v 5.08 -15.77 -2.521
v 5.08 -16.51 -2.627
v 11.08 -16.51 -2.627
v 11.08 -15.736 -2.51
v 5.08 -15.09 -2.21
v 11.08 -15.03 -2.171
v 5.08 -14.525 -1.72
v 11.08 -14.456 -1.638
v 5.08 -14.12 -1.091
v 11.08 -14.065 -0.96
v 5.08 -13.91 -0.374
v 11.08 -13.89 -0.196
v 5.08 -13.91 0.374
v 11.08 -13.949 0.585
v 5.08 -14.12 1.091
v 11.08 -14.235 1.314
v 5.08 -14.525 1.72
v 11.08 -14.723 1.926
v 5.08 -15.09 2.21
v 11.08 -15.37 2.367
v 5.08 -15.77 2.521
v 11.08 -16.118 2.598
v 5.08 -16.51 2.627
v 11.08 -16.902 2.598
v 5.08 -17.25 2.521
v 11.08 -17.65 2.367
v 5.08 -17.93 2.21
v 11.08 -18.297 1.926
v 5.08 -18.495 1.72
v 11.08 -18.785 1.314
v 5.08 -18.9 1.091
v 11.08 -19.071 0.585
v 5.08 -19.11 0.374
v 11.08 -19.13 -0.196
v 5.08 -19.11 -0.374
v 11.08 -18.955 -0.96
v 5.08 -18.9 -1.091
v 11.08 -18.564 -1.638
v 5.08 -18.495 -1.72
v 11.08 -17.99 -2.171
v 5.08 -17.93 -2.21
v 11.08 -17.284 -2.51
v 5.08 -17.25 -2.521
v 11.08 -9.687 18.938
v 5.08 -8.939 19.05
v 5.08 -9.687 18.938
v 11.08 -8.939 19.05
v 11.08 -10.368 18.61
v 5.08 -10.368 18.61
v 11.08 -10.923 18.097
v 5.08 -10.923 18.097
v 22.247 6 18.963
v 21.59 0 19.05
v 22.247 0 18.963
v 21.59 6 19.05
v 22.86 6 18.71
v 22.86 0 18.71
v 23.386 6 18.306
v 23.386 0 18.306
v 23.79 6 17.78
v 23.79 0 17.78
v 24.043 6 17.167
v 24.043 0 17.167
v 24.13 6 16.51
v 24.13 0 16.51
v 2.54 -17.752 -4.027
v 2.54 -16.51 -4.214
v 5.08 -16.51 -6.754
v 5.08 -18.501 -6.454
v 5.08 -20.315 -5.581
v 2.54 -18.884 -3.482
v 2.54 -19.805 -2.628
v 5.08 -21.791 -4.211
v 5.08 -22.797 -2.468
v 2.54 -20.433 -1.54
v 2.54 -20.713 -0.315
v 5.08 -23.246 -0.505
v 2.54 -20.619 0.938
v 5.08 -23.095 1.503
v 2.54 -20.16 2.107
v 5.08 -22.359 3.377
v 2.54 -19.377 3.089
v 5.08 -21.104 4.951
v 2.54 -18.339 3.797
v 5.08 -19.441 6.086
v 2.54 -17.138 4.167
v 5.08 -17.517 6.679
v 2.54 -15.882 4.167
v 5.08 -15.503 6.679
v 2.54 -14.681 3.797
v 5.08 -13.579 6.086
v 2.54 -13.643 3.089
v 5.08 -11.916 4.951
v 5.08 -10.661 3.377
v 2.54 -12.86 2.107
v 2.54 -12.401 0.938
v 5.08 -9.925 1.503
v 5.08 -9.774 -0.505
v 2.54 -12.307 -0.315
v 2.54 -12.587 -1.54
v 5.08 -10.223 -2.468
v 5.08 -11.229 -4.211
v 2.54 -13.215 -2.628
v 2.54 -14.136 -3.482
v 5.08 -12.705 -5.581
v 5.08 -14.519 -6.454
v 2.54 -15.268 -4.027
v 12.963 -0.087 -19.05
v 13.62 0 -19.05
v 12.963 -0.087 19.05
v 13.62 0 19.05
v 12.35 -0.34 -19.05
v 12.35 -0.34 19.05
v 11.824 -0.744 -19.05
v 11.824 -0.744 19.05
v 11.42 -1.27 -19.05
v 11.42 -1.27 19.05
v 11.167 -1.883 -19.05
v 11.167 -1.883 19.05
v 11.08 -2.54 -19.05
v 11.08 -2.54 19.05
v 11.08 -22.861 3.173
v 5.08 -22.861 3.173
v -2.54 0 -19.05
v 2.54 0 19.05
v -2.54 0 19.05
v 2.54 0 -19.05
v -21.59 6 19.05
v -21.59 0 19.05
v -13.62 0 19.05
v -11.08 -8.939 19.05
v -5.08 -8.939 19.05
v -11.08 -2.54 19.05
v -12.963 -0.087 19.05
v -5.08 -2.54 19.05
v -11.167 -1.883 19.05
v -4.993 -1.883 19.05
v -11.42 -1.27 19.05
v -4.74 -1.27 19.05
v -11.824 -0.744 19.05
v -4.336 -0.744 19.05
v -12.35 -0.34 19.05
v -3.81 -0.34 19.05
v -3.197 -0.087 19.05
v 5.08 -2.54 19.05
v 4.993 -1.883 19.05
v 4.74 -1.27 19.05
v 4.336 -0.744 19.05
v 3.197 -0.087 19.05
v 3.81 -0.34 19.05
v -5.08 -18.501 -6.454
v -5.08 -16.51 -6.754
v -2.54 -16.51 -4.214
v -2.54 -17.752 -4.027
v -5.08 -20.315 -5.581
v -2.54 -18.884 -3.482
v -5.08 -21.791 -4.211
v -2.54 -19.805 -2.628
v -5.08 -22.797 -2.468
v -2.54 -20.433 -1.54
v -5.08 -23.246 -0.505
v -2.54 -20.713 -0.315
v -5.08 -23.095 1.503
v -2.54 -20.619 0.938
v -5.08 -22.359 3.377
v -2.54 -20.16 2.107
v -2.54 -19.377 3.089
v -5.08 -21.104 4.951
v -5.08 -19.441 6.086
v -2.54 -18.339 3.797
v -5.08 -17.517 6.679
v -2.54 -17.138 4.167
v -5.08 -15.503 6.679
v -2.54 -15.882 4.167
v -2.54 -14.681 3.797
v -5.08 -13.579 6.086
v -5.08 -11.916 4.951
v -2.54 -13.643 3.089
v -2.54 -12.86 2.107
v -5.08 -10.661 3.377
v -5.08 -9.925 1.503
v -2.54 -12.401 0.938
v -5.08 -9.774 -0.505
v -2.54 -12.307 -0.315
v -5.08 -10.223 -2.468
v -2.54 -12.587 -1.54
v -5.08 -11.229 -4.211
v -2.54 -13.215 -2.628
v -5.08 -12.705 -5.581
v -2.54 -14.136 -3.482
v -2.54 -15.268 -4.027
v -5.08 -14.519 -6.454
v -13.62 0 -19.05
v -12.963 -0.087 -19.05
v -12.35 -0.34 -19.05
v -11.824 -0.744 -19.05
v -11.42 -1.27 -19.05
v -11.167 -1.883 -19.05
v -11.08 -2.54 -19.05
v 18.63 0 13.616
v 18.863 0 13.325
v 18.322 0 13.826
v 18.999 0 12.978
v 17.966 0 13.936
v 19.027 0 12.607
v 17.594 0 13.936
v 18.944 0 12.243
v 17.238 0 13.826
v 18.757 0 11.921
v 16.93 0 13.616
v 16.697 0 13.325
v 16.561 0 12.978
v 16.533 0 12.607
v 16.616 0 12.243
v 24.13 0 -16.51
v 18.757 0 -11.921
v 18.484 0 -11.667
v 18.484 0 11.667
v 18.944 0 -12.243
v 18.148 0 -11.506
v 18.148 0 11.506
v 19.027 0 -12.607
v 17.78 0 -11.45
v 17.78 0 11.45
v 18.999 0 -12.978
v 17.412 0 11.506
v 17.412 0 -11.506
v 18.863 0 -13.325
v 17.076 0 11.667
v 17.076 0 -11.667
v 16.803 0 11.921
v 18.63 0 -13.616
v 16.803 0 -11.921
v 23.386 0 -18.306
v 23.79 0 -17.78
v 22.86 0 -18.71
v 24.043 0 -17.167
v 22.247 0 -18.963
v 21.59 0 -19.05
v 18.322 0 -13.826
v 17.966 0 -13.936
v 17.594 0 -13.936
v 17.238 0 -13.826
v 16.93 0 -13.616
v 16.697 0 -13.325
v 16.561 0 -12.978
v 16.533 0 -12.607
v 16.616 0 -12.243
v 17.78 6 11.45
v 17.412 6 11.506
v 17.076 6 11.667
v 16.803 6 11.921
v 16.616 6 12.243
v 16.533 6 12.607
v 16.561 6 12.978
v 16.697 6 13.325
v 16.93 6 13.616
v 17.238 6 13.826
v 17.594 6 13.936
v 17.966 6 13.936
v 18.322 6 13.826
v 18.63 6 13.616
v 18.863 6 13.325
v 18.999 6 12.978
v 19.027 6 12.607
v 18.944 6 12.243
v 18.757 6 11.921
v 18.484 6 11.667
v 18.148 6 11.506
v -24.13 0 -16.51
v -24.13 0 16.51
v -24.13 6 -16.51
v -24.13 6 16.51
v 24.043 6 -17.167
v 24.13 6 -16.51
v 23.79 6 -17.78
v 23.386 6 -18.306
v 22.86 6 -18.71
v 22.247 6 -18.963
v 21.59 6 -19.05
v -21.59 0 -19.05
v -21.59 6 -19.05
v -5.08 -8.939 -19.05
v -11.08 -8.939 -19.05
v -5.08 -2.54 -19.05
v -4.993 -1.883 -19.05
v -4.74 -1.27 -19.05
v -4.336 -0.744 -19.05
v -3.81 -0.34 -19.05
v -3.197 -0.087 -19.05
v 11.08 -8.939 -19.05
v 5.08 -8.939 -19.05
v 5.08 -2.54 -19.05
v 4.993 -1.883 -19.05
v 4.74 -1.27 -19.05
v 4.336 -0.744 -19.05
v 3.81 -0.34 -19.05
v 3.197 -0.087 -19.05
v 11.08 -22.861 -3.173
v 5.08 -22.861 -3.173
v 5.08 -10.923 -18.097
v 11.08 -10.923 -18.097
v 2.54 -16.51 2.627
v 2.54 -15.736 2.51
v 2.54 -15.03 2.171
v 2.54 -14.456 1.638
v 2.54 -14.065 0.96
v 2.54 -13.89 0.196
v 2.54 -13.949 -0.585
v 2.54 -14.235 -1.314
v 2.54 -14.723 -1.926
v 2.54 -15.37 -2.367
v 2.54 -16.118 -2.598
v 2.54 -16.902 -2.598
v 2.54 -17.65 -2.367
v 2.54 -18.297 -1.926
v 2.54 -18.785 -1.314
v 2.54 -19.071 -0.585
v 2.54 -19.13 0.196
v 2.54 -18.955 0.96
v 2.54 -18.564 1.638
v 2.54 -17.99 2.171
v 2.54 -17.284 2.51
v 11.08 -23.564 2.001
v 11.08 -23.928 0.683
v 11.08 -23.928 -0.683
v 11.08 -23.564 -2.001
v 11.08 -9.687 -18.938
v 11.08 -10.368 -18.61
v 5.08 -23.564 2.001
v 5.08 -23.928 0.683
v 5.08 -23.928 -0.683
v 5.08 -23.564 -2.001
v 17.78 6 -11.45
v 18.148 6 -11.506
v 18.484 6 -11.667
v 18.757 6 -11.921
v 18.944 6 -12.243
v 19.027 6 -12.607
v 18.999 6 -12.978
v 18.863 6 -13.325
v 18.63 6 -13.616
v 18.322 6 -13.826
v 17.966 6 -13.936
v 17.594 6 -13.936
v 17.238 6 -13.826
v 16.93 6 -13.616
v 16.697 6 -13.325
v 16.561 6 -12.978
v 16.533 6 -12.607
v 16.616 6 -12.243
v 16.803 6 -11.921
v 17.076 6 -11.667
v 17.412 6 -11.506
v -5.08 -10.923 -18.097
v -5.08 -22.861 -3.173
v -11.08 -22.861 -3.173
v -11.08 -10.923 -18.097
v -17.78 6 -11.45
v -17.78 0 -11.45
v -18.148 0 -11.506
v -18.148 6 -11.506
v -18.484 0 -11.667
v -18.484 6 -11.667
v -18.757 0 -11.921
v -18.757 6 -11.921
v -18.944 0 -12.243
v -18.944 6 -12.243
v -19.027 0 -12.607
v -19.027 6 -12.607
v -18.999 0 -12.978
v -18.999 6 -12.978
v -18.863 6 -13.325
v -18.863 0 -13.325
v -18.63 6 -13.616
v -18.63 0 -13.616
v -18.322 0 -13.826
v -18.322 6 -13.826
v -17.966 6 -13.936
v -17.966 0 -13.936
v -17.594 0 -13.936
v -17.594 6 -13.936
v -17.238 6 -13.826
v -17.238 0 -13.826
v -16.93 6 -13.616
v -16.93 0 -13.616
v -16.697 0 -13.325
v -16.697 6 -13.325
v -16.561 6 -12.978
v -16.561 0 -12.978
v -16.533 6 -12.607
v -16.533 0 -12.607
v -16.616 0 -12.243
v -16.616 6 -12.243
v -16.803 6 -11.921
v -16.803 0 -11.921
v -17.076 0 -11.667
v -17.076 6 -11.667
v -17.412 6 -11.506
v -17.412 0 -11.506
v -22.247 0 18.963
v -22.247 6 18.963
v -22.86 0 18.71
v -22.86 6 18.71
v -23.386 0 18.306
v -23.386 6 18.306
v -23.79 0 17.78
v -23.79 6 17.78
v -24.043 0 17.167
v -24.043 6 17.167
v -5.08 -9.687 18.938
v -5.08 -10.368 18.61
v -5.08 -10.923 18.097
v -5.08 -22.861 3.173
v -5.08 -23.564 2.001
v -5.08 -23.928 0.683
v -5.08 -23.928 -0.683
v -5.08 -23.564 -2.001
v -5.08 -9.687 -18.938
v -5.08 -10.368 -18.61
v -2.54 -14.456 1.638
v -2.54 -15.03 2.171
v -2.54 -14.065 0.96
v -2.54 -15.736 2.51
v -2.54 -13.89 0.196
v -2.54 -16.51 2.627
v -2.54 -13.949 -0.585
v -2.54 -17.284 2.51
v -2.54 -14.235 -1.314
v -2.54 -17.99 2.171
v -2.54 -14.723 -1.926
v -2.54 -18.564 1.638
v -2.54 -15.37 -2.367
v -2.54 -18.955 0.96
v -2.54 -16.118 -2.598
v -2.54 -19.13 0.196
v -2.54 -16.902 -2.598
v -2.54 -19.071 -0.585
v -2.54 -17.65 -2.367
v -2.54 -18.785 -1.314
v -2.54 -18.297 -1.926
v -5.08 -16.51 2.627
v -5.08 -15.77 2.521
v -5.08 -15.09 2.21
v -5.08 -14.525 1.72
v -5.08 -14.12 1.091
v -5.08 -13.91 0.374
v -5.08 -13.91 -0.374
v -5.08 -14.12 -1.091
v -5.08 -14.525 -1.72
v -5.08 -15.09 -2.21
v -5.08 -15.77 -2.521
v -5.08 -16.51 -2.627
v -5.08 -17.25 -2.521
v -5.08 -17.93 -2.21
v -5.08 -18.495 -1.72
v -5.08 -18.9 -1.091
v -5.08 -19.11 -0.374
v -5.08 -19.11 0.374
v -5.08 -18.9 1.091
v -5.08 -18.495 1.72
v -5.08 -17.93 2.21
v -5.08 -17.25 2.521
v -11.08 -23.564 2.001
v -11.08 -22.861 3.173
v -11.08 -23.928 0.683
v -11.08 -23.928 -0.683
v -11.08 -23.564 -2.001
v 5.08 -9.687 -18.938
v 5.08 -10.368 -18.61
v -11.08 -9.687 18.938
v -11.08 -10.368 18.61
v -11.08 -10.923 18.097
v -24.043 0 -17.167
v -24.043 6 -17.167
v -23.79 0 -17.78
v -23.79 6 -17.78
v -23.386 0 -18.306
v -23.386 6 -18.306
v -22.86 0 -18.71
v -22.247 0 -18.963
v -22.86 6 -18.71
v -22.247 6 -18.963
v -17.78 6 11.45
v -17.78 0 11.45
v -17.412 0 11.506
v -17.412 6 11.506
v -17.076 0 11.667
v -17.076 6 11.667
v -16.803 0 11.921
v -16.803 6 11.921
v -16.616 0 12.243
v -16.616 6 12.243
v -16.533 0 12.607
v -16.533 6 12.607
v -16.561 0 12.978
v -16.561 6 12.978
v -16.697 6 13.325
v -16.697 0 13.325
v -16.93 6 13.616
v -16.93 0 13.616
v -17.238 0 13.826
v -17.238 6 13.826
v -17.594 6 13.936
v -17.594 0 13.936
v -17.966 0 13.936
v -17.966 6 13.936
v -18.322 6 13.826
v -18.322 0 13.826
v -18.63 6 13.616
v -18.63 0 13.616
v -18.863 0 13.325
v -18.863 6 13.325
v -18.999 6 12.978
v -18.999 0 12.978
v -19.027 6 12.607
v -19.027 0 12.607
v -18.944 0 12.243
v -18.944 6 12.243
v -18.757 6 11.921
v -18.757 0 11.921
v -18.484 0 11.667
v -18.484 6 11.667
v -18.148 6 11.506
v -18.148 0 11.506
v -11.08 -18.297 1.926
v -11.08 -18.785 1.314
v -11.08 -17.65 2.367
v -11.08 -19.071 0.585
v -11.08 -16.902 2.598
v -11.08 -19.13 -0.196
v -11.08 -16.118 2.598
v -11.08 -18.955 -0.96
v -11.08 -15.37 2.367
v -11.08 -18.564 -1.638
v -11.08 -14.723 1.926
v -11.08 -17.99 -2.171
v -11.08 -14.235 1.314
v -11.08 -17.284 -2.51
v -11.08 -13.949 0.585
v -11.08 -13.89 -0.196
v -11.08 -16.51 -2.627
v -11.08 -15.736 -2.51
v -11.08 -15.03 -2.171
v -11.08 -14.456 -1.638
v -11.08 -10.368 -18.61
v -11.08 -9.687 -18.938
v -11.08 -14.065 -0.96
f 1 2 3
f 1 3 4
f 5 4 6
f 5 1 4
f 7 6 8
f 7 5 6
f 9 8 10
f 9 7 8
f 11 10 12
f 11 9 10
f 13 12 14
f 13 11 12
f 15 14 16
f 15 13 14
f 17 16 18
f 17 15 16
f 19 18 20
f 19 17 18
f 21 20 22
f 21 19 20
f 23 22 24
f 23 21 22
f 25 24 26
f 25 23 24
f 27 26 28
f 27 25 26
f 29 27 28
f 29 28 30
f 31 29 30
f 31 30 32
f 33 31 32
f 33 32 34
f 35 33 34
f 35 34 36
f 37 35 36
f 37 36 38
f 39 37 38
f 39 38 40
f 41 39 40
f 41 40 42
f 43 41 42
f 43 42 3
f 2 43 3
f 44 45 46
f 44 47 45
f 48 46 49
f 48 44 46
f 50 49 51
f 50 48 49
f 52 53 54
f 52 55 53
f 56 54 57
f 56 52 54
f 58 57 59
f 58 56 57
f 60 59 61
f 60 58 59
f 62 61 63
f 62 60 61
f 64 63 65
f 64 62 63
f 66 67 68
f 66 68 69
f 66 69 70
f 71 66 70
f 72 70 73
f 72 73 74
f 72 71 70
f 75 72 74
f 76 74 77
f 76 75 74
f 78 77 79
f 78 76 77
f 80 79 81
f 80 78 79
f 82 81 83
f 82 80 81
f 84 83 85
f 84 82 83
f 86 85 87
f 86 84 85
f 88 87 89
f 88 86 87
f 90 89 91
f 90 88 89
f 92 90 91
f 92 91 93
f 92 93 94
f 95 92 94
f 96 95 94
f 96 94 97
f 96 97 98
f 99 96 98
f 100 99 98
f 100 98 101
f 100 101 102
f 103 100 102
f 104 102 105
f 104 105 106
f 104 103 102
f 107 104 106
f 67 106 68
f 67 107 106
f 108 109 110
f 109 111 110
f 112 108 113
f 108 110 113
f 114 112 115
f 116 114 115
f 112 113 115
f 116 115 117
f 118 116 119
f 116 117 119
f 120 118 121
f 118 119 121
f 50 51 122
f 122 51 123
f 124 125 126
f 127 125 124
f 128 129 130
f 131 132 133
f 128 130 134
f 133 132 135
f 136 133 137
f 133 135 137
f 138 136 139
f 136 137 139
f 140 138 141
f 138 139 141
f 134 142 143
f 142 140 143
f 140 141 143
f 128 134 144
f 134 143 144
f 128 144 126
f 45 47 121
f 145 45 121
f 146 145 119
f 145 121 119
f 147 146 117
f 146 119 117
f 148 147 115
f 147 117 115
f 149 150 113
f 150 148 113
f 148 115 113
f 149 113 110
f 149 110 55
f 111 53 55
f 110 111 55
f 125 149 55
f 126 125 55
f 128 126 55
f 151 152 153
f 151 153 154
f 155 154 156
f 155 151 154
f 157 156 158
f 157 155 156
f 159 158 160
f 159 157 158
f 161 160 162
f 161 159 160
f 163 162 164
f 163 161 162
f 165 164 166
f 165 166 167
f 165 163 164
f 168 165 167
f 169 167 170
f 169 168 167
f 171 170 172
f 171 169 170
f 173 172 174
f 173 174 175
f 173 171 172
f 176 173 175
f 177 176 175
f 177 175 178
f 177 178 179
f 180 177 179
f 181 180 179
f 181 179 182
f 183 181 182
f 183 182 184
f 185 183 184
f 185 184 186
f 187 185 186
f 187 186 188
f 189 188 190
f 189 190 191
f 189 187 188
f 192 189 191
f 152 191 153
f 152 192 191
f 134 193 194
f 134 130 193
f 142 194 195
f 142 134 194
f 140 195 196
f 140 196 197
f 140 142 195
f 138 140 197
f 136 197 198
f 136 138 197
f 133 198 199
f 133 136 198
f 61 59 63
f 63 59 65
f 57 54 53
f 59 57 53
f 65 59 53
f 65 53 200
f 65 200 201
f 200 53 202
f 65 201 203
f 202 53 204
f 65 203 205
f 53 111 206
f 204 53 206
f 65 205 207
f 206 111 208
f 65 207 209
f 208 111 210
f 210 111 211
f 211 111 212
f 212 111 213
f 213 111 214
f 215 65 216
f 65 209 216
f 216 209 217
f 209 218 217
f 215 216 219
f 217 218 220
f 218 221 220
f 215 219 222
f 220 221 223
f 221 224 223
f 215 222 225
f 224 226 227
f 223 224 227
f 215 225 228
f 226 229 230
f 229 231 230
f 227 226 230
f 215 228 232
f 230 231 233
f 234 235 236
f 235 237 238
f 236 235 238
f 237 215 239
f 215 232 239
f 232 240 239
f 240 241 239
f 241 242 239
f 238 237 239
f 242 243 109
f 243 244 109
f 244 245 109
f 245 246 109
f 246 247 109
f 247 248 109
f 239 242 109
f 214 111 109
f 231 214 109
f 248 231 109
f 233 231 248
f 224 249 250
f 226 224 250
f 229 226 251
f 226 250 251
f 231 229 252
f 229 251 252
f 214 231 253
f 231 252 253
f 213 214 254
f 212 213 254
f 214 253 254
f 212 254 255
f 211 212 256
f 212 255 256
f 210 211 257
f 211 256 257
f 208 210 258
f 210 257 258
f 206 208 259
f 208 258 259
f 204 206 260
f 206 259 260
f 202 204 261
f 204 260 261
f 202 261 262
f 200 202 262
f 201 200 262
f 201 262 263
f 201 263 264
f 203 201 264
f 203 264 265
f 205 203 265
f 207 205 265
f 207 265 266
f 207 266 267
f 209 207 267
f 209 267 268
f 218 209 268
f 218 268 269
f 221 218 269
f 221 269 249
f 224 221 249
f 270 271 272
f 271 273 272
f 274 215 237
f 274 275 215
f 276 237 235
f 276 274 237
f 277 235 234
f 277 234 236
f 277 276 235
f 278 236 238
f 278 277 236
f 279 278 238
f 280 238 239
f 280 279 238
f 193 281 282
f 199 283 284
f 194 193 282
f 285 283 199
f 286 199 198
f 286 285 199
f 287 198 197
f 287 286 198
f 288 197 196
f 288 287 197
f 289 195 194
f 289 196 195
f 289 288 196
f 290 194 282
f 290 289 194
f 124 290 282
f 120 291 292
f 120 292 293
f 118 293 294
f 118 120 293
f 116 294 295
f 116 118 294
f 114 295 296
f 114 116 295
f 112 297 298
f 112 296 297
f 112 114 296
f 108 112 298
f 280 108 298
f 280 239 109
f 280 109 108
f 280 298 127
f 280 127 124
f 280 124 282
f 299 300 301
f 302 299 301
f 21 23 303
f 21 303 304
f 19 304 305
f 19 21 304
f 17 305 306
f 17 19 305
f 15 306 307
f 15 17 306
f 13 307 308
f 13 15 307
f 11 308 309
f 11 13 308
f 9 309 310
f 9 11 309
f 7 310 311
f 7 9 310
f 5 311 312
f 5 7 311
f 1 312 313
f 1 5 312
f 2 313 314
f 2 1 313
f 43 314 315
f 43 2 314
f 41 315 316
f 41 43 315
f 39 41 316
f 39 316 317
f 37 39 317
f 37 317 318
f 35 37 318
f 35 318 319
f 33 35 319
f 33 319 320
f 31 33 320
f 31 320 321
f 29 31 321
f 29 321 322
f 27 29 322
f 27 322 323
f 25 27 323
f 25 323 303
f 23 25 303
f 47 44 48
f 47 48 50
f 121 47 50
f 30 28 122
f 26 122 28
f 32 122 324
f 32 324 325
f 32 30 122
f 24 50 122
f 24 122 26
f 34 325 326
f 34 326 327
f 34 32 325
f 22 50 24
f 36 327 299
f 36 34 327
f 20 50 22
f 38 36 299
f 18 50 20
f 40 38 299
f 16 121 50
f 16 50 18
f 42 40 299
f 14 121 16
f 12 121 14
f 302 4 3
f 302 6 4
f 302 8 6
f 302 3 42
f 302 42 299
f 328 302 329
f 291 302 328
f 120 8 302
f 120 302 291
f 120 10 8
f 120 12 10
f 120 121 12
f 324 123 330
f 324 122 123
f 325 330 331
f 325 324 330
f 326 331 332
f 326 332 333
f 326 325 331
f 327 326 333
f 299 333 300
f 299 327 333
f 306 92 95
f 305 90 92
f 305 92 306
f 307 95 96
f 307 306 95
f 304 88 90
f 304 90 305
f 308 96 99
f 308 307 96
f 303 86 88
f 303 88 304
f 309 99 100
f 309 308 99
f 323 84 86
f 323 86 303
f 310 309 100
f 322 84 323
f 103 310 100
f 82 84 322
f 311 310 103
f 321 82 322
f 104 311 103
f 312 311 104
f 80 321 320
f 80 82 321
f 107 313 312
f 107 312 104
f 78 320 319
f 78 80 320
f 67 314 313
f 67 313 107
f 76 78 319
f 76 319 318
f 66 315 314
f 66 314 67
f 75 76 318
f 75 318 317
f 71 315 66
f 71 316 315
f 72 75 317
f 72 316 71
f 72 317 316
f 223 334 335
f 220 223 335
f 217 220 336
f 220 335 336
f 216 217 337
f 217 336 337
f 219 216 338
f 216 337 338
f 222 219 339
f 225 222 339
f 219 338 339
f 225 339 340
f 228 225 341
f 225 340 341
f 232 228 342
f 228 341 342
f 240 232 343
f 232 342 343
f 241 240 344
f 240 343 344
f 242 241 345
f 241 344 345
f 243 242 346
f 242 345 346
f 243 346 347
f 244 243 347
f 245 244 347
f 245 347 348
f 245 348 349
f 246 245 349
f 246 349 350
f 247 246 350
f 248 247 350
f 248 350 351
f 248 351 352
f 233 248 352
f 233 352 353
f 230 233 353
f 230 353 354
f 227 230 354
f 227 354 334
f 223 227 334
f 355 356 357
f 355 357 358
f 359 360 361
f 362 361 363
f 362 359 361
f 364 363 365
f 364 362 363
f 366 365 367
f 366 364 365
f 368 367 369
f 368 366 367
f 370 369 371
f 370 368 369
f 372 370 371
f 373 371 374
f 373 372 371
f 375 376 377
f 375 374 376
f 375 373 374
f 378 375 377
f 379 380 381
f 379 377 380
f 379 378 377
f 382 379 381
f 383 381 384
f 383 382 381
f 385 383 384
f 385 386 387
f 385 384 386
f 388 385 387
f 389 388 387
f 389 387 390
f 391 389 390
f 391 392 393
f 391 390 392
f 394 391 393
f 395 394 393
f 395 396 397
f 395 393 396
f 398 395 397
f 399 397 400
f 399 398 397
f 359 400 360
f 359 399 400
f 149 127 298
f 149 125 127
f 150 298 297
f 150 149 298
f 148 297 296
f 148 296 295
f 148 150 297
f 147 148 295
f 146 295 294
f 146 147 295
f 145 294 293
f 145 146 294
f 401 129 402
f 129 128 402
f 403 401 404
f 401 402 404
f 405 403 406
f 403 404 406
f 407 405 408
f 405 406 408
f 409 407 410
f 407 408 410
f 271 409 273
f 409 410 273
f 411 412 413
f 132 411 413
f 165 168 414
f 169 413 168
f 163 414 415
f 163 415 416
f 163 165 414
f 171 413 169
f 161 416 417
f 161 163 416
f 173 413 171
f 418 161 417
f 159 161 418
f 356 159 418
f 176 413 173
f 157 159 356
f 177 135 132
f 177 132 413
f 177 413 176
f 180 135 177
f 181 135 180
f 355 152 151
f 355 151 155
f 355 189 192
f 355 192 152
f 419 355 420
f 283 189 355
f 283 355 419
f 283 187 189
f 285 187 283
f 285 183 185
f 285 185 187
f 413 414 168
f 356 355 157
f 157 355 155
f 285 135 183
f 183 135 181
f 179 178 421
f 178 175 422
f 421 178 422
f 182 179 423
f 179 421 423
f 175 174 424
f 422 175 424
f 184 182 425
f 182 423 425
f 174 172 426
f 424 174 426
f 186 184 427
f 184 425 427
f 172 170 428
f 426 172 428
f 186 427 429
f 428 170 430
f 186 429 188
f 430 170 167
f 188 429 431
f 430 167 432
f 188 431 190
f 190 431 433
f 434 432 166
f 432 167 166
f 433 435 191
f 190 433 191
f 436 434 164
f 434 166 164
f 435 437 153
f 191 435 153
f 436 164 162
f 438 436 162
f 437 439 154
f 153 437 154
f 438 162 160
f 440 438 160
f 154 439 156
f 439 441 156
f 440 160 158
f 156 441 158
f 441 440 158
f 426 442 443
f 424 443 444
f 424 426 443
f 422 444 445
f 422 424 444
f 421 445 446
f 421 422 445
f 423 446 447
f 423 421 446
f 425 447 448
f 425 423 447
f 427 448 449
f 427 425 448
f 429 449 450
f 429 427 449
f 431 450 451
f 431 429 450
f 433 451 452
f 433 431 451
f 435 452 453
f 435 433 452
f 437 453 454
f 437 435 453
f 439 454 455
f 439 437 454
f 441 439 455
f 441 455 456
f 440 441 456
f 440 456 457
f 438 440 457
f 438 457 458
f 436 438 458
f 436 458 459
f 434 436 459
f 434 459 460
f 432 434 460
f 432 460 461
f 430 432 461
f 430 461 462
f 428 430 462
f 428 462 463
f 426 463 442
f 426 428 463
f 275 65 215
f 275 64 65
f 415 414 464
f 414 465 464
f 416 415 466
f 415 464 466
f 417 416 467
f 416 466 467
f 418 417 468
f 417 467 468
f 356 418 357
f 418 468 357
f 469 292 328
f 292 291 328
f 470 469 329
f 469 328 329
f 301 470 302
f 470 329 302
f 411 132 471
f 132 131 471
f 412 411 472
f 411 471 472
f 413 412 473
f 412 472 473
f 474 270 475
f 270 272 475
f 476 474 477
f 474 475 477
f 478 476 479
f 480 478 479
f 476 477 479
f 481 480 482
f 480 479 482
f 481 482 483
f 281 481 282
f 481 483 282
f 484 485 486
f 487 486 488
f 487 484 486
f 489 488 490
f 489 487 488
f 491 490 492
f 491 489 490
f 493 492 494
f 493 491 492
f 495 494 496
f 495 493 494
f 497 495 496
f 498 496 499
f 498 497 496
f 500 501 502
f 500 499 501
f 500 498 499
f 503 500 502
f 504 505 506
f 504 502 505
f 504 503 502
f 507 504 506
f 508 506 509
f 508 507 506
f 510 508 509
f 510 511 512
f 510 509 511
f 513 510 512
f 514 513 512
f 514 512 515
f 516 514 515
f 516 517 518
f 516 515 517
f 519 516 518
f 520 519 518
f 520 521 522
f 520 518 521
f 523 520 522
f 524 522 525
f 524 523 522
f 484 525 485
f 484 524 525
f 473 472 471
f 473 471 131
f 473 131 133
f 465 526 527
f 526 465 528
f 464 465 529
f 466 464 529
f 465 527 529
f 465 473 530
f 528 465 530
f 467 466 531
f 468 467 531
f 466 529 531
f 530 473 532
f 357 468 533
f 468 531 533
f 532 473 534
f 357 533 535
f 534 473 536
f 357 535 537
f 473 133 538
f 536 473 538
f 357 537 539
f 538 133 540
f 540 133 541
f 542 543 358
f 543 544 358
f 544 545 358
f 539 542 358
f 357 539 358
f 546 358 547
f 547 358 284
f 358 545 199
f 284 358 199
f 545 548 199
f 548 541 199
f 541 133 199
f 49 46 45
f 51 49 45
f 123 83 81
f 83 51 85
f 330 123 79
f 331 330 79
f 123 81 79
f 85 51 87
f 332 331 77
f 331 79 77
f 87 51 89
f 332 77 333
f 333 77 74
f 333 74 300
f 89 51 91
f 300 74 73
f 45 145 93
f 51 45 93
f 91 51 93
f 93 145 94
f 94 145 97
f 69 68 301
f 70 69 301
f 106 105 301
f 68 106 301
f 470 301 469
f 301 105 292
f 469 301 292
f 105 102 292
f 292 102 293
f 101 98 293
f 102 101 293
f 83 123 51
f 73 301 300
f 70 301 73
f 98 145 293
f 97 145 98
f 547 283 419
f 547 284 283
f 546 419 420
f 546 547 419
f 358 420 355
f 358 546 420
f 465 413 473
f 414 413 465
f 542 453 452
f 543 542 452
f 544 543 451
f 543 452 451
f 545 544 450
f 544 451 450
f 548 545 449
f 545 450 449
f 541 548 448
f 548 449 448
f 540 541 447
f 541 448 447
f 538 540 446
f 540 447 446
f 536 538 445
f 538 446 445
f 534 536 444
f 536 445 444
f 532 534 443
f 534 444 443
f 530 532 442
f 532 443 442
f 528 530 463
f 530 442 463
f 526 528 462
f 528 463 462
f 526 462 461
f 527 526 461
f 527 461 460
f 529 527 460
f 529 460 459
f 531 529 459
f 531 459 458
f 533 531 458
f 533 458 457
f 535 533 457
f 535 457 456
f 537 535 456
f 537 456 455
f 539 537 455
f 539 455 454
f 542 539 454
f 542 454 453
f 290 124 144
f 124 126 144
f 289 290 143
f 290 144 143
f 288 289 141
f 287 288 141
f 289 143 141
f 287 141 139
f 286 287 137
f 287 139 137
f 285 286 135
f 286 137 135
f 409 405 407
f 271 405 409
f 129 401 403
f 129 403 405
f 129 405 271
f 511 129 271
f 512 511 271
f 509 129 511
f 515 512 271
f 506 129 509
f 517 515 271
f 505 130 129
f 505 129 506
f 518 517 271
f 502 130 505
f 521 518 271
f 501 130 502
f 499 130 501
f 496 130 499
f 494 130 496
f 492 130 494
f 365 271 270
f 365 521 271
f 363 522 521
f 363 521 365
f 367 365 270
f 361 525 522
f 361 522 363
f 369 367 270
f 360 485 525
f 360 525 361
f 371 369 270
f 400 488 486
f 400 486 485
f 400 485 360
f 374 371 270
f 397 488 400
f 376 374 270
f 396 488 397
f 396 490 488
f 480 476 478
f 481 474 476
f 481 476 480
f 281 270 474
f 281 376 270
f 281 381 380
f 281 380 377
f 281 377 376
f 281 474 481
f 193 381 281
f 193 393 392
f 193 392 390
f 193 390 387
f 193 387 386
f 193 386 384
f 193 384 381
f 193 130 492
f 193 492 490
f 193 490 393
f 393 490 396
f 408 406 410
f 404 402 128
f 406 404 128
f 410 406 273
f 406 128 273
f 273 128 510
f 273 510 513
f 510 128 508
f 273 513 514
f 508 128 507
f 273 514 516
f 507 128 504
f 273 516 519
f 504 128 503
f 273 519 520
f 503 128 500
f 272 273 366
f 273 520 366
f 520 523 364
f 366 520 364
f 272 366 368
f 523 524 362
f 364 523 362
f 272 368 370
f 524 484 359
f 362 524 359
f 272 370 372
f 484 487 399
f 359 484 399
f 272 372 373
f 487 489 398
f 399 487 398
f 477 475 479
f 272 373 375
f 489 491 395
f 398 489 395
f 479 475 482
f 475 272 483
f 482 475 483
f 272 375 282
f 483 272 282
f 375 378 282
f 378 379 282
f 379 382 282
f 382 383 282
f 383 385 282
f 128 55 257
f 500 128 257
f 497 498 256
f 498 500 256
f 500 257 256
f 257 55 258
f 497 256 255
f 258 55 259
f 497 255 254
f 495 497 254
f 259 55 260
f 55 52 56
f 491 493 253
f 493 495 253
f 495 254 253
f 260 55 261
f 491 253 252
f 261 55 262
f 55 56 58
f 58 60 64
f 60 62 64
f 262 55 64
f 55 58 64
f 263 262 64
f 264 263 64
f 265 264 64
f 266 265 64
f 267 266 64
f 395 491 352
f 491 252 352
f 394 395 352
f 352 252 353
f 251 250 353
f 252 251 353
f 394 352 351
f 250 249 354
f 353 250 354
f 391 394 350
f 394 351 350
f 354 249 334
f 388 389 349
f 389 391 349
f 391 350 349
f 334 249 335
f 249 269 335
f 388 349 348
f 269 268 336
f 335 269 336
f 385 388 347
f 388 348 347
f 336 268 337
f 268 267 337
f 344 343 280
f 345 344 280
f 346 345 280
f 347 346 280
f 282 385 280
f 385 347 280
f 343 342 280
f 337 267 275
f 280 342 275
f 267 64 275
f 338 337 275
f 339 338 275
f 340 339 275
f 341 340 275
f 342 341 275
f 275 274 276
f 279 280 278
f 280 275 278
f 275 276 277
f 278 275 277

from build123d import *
from OCP.BRepFilletAPI import BRepFilletAPI_MakeFillet

# Parameters (mm, degrees)
SKETCH1_R           = 2.627
BOSS_EXTRUDE1_DEPTH = 6
BOSS_EXTRUDE2_START = -5.08
SKETCH1_3_W         = 38.1
SKETCH1_3_H         = 5.999999938
BOSS_EXTRUDE2_DEPTH = 24.13
SKETCH3_R           = 1.25
CUT_EXTRUDE1_DEPTH  = 44.944503594
FILLET1_R1          = 2.54
FILLET1_R2          = 5.08
SKETCH4_R           = 4.2145
SKETCH4_R_2         = 2.627
BOSS_EXTRUDE3_DEPTH = 2.54
BOSS_EXTRUDE4_START = 7.62
SKETCH4_2_R         = 4.2145
SKETCH4_2_R_2       = 2.627
BOSS_EXTRUDE4_DEPTH = 2.54
CHAMFER2_SIZE       = 2.54


with BuildPart() as part:
    # Sketch1 → Boss-Extrude1 (new body)
    with BuildSketch(Plane(origin=(5.08, 0, 0), x_dir=(0, 0, -1), z_dir=(1, 0, 0))):
        Polygon((-19.05, 0), (-19.05, -10.16), (0, -25.4), (19.05, -10.16), (19.05, 0), align=None)
        with Locations((0, -16.51)):
            Circle(SKETCH1_R, mode=Mode.SUBTRACT)
    boss_extrude1 = extrude(amount=BOSS_EXTRUDE1_DEPTH)

    # Sketch1<3> → Boss-Extrude2 (add)
    with BuildSketch(Plane(origin=(5.08, 0, 0), x_dir=(0, 0, -1), z_dir=(1, 0, 0)).offset(BOSS_EXTRUDE2_START)):
        with Locations((0, 2.999999969)):
            Rectangle(SKETCH1_3_W, SKETCH1_3_H)
    boss_extrude2 = extrude(amount=BOSS_EXTRUDE2_DEPTH)

    # Sketch3 → Cut-Extrude1 (cut, through all)
    with BuildSketch(Plane(origin=(0, 5.999999938, 0), x_dir=(1, 0, 0), z_dir=(0, 1, 0))):
        with Locations(Location((17.78, 12.7, 0), (0, 0, 270))):
            Circle(SKETCH3_R)
        with Locations(Location((17.78, -12.7, 0), (0, 0, 90))):
            Circle(SKETCH3_R)
    cut_extrude1 = extrude(amount=-CUT_EXTRUDE1_DEPTH, mode=Mode.SUBTRACT)

    # Mirror2: Boss-Extrude2, Cut-Extrude1 across plane
    add(boss_extrude2.mirror(Plane(origin=(0, 0, 0), x_dir=(0, 0, 1), z_dir=(1, 0, 0))))
    add(cut_extrude1.mirror(Plane(origin=(0, 0, 0), x_dir=(0, 0, 1), z_dir=(1, 0, 0))), mode=Mode.SUBTRACT)

    # Mirror3: Boss-Extrude1 across plane
    add(boss_extrude1.mirror(Plane(origin=(0, 0, 0), x_dir=(0, 0, 1), z_dir=(1, 0, 0))))

    # Fillet1: one fillet with a radius per group of edges: ONE call of the kernel's fillet builder (fillet() takes one radius for all edges)
    fillet1_edges_1 = [part.edges().sort_by_distance(p)[0] for p in [
        (8.08, -10.16, 19.05),
        (8.08, -10.16, -19.05),
        (11.08, 0, 0),
        (24.13, 2.999999969, 19.05),
        (24.13, 2.999999969, -19.05),
        (-24.13, 2.999999969, -19.05),
        (-24.13, 2.999999969, 19.05),
        (-8.08, -10.16, -19.05),
        (-8.08, -10.16, 19.05),
        (-5.08, 0, 0),
        (-11.08, 0, 0),
        (5.08, 0, 0),
    ]]
    fillet1_edges_2 = [part.edges().sort_by_distance(p)[0] for p in [
        (8.08, -25.4, 0),
        (-8.08, -25.4, 0),
    ]]
    fillet1 = BRepFilletAPI_MakeFillet(part.part.solid().wrapped)
    for e in fillet1_edges_1:
        fillet1.Add(FILLET1_R1, e.wrapped)
    for e in fillet1_edges_2:
        fillet1.Add(FILLET1_R2, e.wrapped)
    add(Compound.cast(fillet1.Shape()), mode=Mode.REPLACE)

    # Sketch4 → Boss-Extrude3 (add)
    with BuildSketch(Plane.ZY.offset(-5.08)):
        with Locations(Location((0, -16.51, 0), (0, 0, 180))):
            Circle(SKETCH4_R)
        with Locations((0, -16.51)):
            Circle(SKETCH4_R_2, mode=Mode.SUBTRACT)
    extrude(amount=BOSS_EXTRUDE3_DEPTH)

    # Sketch4<2> → Boss-Extrude4 (add)
    with BuildSketch(Plane.ZY.offset(-5.08).offset(BOSS_EXTRUDE4_START)):
        with Locations(Location((0, -16.51, 0), (0, 0, 180))):
            Circle(SKETCH4_2_R)
        with Locations((0, -16.51)):
            Circle(SKETCH4_2_R_2, mode=Mode.SUBTRACT)
    extrude(amount=BOSS_EXTRUDE4_DEPTH)

    # Chamfer2
    chamfer2_edges = [part.edges().sort_by_distance(p)[0] for p in [
        (5.08, -16.51, 4.2145),
        (-5.08, -16.51, 4.2145),
    ]]
    chamfer(chamfer2_edges, length=CHAMFER2_SIZE - 0.0001)  # a hair under: the kernel refuses the full size


solid = part.part
